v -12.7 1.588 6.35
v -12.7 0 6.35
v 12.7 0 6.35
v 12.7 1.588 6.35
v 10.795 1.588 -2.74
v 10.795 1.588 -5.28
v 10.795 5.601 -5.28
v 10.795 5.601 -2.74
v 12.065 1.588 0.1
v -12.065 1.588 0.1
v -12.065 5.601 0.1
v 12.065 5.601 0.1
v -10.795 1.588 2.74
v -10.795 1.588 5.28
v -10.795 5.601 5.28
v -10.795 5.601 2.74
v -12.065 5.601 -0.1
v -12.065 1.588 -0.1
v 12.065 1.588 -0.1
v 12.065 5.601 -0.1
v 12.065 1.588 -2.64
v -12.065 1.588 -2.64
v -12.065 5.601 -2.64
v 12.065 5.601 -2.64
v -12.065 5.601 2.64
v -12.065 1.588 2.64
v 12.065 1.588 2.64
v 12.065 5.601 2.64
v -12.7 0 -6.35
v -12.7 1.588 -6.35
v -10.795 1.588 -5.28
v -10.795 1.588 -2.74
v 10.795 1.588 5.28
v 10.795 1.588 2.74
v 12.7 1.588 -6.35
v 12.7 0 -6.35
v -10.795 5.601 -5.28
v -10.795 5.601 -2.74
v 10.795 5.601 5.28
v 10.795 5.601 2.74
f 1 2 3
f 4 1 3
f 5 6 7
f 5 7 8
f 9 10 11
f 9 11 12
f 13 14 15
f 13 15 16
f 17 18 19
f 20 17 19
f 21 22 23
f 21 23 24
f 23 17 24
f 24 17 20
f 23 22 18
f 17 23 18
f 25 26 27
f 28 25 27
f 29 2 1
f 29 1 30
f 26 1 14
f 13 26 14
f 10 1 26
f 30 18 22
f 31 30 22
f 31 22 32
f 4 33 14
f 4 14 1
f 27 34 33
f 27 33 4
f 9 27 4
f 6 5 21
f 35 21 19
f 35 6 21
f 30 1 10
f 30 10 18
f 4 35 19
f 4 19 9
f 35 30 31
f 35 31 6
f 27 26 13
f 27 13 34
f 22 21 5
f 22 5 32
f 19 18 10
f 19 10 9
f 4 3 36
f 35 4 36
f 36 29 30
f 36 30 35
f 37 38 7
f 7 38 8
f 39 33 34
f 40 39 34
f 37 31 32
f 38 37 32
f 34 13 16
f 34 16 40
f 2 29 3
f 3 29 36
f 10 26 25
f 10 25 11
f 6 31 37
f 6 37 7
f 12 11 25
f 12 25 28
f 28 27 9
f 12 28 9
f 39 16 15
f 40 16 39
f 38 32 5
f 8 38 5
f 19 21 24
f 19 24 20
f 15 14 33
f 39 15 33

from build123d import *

# Parameters (mm, degrees)
SKETCH1_W           = 25.4
SKETCH1_H           = 12.7
BOSS_EXTRUDE1_DEPTH = 1.5875
SKETCH2_W           = 21.59
SKETCH2_H           = 2.54
SKETCH2_W_2         = 24.13
BOSS_EXTRUDE2_DEPTH = 4.0132


with BuildPart() as part:
    # Sketch1 → Boss-Extrude1 (new body)
    with BuildSketch(Plane(origin=(0, 0, 0), x_dir=(1, 0, 0), z_dir=(0, 1, 0))):
        Rectangle(SKETCH1_W, SKETCH1_H)
    extrude(amount=BOSS_EXTRUDE1_DEPTH)

    # Sketch2 → Boss-Extrude2 (add)
    with BuildSketch(Plane(origin=(0, 1.5875, 0), x_dir=(1, 0, 0), z_dir=(0, 1, 0))):
        with Locations((0, -4.01)):
            Rectangle(SKETCH2_W, SKETCH2_H)
        with Locations((0, -1.37)):
            Rectangle(SKETCH2_W_2, SKETCH2_H)
    boss_extrude2 = extrude(amount=BOSS_EXTRUDE2_DEPTH)

    # Mirror1: Boss-Extrude2 across plane
    add(boss_extrude2.mirror(Plane.XY))


solid = part.part
